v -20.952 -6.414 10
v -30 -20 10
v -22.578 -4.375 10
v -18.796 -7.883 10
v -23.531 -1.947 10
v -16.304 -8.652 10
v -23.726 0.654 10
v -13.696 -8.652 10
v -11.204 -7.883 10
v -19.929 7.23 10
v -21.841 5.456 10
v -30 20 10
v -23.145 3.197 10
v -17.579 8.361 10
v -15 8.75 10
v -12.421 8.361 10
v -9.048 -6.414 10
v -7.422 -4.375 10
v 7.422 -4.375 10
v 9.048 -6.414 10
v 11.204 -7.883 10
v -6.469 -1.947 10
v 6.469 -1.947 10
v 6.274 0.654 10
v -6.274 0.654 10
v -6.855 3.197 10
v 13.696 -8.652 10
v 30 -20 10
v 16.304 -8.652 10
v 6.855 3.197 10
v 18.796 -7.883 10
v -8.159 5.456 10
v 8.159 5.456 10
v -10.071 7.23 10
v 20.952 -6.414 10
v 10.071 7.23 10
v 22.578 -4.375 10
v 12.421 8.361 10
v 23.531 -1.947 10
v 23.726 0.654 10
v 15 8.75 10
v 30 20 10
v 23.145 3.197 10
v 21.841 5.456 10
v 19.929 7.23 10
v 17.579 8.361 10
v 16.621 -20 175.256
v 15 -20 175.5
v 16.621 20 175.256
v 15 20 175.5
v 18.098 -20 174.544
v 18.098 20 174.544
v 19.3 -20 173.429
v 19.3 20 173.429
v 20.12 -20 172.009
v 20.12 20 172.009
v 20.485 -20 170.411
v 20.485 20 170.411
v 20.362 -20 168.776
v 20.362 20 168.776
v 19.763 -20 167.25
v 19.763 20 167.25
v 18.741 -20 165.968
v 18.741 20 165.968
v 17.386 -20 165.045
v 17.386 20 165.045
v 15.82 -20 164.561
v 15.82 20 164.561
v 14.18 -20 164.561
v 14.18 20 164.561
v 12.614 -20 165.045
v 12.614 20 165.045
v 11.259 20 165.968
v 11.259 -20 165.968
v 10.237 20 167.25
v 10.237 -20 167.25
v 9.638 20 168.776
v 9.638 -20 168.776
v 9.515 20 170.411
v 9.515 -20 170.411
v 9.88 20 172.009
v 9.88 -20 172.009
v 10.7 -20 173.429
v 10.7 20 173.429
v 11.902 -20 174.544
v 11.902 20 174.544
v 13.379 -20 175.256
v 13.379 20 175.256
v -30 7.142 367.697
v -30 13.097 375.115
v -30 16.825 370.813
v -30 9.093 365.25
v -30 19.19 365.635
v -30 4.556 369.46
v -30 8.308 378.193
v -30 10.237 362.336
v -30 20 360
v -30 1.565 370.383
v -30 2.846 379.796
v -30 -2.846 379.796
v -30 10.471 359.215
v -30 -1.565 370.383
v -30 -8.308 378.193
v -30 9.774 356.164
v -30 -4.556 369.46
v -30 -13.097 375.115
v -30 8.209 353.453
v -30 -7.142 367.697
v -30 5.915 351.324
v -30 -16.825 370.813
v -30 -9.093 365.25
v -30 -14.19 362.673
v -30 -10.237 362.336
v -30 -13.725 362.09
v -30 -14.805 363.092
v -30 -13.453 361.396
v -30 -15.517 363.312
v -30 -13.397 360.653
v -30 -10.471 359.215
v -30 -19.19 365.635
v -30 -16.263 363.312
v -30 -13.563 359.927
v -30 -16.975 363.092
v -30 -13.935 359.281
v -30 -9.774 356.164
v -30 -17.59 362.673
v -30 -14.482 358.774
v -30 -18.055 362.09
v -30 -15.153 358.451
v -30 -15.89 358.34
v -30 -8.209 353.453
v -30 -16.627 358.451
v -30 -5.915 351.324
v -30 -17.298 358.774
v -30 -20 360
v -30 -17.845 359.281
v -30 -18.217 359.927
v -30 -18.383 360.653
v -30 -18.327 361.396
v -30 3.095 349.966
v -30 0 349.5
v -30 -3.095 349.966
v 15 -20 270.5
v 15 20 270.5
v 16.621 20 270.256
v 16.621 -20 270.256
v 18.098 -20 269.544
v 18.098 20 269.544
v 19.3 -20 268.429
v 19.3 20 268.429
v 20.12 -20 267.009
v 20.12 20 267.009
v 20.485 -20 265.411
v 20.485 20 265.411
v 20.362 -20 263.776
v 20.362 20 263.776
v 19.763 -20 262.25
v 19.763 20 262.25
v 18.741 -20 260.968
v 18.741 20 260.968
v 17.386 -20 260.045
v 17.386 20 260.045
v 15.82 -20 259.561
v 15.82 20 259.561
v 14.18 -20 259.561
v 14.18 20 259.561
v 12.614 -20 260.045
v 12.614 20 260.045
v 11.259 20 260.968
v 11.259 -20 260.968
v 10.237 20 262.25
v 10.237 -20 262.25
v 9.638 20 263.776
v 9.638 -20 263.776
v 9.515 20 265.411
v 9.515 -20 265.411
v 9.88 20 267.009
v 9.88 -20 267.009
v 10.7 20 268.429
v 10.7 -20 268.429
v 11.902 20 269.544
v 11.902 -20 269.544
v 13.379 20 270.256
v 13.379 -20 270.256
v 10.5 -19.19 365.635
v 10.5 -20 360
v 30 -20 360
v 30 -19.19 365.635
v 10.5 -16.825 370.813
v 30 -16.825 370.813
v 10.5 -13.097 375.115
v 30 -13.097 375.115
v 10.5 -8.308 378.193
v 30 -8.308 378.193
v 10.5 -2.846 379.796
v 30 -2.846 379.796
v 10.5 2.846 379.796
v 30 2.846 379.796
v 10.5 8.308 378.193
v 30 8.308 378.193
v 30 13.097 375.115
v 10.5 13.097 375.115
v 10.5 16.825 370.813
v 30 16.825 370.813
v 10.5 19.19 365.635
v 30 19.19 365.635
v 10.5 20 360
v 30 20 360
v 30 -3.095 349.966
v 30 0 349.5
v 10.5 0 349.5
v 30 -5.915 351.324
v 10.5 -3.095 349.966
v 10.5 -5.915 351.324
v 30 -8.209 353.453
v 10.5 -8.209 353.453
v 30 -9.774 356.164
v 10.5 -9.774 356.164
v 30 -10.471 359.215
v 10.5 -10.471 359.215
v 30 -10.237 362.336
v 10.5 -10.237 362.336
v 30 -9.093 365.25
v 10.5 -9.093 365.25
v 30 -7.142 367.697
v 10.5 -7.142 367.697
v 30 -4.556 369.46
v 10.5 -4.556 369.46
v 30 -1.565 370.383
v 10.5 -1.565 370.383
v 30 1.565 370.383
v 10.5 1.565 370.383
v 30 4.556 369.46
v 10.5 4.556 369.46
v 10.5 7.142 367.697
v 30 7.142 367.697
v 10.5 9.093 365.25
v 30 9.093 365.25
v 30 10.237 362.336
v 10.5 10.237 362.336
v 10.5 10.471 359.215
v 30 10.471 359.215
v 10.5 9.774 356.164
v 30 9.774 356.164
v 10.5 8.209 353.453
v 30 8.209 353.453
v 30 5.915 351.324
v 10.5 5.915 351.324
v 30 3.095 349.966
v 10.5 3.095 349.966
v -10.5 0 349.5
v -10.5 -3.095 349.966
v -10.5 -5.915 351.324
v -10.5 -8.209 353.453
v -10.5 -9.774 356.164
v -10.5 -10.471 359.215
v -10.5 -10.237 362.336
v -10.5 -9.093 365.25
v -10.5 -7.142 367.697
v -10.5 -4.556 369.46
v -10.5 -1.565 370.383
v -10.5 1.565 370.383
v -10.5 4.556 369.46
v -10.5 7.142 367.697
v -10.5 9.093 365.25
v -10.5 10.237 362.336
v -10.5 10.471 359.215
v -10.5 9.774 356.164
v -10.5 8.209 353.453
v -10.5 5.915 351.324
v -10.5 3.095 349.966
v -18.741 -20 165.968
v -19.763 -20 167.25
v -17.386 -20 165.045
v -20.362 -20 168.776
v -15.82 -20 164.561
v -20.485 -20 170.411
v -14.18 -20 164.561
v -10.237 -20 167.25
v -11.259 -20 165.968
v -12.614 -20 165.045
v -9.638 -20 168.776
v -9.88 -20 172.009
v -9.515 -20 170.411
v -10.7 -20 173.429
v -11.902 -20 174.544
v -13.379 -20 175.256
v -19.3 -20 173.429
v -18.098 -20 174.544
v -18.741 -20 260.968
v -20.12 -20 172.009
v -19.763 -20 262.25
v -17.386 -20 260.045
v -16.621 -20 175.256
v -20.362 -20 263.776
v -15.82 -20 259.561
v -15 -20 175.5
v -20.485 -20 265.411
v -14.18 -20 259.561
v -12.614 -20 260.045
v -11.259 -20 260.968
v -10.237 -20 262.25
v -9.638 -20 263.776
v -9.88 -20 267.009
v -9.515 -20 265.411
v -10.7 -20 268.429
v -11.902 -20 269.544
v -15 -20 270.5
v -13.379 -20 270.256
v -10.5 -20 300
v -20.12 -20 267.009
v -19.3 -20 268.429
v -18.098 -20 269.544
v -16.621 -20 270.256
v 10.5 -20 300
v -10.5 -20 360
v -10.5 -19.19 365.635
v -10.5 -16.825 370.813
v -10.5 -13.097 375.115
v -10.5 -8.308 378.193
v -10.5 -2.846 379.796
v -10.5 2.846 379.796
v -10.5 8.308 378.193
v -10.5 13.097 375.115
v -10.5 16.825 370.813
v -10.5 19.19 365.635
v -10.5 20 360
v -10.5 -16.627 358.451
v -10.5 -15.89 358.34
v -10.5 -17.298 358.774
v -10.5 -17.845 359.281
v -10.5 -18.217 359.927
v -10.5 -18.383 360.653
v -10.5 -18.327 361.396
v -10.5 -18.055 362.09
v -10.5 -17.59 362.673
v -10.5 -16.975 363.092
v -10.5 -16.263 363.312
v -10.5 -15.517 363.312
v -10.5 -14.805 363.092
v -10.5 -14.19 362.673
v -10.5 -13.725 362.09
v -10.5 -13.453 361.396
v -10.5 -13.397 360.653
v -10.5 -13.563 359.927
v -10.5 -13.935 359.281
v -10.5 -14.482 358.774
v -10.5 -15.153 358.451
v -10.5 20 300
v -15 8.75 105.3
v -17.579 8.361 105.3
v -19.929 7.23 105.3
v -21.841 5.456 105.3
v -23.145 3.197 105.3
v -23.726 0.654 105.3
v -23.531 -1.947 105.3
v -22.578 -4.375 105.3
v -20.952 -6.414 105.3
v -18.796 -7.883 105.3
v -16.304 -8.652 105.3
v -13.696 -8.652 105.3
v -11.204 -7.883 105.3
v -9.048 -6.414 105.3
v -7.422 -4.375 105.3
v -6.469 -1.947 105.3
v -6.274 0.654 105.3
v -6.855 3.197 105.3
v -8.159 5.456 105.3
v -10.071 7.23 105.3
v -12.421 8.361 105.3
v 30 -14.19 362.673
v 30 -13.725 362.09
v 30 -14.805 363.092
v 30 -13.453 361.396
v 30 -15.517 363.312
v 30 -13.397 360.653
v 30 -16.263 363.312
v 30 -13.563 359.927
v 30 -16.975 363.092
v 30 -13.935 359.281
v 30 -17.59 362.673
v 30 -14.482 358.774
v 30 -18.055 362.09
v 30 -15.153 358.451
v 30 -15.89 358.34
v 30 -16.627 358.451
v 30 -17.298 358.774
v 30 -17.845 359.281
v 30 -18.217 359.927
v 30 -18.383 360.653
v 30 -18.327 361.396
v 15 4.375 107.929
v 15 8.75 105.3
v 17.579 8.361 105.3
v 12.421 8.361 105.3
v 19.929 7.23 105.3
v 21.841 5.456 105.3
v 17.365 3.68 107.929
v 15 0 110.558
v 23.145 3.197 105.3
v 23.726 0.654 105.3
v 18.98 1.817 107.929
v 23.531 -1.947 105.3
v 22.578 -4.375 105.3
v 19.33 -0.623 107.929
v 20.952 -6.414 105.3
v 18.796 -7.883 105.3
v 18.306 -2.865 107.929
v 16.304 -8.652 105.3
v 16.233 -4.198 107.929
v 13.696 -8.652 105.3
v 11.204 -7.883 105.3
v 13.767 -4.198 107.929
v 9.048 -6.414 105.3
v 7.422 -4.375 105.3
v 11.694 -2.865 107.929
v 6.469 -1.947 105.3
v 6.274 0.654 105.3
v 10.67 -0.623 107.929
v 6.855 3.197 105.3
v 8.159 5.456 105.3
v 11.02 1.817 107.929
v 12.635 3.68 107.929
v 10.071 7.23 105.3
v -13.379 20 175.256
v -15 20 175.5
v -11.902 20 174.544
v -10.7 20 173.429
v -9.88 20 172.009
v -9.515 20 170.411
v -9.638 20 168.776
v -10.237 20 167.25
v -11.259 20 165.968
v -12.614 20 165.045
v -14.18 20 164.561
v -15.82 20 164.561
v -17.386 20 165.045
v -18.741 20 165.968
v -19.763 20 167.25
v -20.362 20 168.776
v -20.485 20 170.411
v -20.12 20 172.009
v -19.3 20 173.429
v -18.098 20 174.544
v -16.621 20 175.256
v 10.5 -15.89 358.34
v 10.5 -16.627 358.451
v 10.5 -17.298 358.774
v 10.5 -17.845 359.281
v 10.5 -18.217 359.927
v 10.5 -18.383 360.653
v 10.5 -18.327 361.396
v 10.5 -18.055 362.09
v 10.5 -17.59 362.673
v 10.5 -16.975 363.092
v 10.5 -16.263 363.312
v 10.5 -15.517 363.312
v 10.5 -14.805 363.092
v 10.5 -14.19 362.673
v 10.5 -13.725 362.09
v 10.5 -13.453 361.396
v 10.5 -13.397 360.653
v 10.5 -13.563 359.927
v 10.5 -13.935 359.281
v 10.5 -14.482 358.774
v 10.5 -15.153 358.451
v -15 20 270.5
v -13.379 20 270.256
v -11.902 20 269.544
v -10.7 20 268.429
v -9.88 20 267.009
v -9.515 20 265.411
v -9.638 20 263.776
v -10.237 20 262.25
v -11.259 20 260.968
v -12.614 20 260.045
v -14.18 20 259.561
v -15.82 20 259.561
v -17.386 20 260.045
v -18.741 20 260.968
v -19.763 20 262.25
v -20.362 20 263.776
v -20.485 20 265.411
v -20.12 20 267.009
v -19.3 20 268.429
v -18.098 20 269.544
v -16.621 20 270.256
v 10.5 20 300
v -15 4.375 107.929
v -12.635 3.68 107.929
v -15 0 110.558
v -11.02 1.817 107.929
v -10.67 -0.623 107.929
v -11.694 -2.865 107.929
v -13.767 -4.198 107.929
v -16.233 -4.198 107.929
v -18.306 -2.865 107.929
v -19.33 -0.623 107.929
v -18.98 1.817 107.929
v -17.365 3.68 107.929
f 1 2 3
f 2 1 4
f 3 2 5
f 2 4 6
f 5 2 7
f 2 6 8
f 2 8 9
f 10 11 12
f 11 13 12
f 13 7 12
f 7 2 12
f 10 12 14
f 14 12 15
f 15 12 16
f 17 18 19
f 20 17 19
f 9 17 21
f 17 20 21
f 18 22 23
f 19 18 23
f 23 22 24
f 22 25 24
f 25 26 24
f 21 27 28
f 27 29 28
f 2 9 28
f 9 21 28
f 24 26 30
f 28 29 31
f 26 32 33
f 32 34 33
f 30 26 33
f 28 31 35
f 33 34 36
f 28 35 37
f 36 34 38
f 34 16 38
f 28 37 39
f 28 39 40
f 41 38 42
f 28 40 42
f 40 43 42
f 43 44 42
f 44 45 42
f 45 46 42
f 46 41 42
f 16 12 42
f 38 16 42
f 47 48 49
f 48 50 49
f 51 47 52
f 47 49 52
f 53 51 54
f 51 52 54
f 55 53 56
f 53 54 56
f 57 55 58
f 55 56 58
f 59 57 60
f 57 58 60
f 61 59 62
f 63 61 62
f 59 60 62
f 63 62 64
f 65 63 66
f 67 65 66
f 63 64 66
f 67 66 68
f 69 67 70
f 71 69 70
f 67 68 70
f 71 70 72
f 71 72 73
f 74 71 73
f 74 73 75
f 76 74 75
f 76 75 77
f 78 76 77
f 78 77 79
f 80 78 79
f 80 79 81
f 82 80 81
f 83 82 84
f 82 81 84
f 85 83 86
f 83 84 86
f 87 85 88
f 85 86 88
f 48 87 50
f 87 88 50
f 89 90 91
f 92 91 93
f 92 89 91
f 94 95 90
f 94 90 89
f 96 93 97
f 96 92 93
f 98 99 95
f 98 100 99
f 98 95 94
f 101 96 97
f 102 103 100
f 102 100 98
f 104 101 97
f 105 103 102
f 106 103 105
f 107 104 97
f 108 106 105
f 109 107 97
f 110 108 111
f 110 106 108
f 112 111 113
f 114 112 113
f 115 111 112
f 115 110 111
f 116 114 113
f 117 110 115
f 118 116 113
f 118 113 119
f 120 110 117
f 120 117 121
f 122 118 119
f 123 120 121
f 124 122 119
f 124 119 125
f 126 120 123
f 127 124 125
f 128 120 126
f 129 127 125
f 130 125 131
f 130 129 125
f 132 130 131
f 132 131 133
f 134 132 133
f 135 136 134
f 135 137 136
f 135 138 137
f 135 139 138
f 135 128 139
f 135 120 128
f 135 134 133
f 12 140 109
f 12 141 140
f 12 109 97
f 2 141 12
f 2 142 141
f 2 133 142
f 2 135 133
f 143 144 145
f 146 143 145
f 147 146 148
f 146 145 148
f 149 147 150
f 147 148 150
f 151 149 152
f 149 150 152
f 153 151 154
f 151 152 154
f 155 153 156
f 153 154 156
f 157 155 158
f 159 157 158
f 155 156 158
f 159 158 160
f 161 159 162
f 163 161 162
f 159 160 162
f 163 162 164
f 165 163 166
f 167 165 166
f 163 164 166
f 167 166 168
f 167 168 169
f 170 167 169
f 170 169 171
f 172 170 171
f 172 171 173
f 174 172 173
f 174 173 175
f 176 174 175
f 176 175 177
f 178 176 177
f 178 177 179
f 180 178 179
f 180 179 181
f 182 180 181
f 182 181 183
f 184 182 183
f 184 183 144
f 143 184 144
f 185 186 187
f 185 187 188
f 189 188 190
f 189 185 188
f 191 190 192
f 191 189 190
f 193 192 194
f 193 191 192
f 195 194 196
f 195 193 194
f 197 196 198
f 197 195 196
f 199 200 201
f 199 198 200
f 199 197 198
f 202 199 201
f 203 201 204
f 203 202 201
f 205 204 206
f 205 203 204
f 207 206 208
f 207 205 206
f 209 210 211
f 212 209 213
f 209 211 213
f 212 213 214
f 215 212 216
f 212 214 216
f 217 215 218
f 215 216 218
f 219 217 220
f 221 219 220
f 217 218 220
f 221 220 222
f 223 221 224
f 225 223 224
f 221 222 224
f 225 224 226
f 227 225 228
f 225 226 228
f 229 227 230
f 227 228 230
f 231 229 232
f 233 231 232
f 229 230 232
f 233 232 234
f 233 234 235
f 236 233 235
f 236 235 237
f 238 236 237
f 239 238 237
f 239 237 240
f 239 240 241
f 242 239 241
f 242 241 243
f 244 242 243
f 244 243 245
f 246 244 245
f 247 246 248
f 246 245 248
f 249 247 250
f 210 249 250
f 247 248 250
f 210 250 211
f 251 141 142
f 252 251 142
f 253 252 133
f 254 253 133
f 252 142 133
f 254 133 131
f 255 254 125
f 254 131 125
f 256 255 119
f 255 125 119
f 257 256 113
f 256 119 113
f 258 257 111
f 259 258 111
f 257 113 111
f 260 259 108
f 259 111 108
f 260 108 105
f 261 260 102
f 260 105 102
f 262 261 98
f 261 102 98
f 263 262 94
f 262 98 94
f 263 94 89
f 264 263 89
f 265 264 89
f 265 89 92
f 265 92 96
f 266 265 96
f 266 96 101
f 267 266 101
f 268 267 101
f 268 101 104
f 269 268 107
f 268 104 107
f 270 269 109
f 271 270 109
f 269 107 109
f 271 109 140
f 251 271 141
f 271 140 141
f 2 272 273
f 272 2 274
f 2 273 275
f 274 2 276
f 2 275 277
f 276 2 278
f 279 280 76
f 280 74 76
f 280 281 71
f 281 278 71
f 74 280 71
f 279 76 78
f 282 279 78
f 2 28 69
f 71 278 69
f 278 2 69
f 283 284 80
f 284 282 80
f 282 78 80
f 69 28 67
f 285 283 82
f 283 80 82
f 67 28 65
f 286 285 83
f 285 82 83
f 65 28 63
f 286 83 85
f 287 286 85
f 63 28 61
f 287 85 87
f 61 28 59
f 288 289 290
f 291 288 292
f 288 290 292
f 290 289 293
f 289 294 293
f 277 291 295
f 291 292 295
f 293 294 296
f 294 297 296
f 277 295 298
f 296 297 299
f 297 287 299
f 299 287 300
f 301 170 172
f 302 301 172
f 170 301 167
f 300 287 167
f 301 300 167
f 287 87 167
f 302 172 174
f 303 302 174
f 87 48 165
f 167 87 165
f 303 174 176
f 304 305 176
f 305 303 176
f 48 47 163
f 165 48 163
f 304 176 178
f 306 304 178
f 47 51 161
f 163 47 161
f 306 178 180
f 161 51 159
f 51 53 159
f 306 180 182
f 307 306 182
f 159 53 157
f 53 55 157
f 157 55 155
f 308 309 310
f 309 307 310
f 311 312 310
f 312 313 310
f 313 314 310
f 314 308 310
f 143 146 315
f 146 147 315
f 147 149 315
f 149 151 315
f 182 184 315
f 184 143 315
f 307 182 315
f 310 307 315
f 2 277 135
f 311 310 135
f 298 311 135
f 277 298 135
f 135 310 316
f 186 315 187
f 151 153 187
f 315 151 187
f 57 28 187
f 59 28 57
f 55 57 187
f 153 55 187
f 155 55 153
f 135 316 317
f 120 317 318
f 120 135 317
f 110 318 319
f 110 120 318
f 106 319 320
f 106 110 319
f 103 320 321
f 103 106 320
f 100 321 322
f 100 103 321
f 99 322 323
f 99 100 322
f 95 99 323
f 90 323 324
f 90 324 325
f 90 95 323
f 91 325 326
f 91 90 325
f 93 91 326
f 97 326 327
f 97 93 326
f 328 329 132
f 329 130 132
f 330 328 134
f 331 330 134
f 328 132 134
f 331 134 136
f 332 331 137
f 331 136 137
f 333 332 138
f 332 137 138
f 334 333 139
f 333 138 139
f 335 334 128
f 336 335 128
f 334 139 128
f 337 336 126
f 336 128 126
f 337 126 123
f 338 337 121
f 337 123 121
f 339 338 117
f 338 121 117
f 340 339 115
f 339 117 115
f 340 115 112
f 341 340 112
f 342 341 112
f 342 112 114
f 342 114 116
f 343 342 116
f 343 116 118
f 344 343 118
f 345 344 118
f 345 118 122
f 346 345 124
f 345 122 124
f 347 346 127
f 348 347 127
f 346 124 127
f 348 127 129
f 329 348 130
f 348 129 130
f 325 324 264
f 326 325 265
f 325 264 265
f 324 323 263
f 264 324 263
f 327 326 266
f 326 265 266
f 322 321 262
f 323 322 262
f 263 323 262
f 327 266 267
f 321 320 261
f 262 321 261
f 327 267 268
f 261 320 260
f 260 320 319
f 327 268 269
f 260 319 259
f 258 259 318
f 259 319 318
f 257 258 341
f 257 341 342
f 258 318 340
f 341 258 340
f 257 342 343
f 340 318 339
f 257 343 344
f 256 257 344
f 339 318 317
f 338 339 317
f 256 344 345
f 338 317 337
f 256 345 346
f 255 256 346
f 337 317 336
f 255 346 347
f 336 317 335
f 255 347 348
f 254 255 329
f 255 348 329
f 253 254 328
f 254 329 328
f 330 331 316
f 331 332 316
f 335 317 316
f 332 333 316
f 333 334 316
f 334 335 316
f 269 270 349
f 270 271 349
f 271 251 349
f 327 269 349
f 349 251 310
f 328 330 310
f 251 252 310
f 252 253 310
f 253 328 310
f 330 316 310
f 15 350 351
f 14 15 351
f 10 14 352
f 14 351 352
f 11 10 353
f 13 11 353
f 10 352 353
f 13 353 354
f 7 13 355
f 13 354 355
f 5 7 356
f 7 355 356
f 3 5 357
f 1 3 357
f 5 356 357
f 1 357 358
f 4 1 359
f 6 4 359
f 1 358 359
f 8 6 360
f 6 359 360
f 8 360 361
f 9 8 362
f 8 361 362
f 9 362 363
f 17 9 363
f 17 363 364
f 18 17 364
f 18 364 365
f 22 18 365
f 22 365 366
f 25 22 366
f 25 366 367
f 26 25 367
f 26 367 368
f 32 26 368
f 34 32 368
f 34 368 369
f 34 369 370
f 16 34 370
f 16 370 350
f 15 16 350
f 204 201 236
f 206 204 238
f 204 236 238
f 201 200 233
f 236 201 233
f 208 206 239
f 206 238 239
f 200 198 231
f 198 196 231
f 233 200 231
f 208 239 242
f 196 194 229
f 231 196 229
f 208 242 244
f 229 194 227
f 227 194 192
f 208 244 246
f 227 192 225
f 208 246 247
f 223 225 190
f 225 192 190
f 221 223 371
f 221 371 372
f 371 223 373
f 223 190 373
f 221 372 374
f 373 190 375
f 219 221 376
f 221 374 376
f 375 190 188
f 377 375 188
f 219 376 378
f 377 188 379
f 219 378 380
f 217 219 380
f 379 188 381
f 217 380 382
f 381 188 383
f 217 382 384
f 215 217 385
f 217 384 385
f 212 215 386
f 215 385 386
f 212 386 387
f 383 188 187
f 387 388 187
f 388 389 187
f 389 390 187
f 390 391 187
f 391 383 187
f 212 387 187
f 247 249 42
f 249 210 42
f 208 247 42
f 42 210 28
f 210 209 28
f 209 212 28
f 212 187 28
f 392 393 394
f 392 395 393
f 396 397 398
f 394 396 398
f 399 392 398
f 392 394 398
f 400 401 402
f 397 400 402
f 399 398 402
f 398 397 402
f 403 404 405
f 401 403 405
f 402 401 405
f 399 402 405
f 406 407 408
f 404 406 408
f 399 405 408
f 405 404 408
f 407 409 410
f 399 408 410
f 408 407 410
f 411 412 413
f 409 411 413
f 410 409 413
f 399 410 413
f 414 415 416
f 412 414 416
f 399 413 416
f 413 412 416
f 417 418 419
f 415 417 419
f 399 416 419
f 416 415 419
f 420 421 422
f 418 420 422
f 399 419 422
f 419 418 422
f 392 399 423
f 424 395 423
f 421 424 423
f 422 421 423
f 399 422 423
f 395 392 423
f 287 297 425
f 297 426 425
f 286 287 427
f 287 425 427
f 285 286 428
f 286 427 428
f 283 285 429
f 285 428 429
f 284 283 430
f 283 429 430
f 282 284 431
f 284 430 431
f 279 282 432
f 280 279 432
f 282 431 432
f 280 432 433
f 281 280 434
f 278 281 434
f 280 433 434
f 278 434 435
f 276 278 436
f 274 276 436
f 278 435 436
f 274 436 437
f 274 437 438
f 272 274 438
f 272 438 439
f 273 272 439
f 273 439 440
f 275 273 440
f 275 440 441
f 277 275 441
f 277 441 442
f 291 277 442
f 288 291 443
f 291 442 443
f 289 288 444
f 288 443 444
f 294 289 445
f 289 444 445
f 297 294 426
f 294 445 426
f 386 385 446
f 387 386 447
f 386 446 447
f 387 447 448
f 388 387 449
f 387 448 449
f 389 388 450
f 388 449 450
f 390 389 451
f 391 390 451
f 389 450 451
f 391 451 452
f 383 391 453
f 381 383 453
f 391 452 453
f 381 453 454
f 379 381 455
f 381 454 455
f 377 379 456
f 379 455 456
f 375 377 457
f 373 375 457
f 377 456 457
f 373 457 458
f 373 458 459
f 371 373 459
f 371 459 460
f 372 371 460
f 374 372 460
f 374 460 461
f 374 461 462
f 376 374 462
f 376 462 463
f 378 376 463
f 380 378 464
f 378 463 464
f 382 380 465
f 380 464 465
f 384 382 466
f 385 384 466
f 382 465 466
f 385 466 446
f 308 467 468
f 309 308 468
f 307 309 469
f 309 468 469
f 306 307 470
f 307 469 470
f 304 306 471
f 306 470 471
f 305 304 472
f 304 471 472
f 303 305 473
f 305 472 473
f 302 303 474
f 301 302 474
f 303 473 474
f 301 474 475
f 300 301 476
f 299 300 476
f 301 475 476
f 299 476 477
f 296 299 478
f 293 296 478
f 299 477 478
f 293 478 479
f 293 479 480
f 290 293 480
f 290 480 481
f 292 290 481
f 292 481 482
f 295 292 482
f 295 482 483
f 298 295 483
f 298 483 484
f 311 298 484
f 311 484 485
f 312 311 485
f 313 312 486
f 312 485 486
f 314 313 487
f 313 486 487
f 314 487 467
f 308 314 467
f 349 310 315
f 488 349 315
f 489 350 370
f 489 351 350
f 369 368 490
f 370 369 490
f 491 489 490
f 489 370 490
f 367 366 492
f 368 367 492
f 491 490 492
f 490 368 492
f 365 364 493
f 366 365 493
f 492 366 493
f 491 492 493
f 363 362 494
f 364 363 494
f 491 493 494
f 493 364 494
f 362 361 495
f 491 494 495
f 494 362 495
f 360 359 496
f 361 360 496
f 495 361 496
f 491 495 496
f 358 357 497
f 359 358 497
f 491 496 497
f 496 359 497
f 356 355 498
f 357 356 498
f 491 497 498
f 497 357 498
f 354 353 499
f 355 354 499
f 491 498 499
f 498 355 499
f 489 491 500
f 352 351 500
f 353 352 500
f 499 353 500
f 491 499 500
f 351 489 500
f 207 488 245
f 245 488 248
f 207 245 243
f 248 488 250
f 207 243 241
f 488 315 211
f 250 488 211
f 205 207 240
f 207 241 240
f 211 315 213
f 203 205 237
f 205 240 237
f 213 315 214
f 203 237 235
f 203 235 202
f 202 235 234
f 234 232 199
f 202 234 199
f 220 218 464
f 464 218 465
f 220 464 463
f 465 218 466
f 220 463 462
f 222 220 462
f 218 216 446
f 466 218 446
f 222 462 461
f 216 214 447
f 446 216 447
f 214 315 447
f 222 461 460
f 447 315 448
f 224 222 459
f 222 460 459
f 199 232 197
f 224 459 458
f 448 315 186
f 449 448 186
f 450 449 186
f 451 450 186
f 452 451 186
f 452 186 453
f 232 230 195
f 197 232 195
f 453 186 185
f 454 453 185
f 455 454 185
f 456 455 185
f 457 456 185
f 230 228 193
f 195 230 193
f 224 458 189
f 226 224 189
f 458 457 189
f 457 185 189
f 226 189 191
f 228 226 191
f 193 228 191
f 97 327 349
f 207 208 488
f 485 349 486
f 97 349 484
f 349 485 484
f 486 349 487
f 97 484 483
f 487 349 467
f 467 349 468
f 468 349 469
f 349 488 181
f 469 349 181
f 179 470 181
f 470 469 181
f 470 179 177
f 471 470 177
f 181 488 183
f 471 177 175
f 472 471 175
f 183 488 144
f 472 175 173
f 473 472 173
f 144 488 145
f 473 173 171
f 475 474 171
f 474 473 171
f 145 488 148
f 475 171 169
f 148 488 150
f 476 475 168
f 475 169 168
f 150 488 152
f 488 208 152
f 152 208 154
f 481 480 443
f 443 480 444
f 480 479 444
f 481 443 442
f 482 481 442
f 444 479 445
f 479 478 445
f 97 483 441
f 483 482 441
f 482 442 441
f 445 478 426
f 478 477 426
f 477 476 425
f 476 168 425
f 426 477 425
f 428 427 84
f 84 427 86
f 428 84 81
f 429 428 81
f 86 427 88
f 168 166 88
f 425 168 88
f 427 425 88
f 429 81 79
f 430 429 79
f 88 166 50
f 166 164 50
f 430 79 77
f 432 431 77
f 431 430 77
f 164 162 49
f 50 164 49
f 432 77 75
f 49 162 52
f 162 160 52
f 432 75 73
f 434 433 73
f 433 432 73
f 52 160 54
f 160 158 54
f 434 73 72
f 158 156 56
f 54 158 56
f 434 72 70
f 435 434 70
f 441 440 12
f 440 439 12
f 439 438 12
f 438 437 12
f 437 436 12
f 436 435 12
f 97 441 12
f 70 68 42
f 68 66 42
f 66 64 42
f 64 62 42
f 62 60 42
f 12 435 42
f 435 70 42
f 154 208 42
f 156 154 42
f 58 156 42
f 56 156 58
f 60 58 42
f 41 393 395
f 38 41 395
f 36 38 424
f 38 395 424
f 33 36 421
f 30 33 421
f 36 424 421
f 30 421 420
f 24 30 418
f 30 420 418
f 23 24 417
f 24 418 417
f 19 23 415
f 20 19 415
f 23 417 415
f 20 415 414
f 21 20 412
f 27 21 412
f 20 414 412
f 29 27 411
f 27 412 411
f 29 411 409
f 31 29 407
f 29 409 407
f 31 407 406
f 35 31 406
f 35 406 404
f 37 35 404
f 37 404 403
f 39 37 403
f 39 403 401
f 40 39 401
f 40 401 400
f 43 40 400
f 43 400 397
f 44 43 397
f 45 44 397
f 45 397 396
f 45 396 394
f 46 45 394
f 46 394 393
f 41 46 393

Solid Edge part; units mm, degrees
sketch "Sketch1" plane through (0, 0, 0) normal (-1, 0, 0) x (0, -1, 0)
  line L0 (-20, 0) -> (20, 0)
  line L1 (20, 0) -> (20, 390)
  line L2 (20, 390) -> (-20, 390)
  line L3 (-20, 390) -> (-20, 0)
extrude "Protrusion1" add sketch "Sketch1" along normal mid plane 60
sketch "Sketch2" plane through (-30, 0, 187.5) normal (-1, 0, 0) x (0, 0, -1)
  circle A0 centre (-172.5, 0) radius 10.5
extrude "ExtrudedCutout_1" cut sketch "Sketch2" against normal blind 60
sketch "Sketch3" plane through (-30, 0, 187.5) normal (-1, 0, 0) x (0, 0, 1)
  line L0 (202.5, -20) -> (172.5, -20)
  line L1 (202.5, 20) -> (202.5, -20)
  line L2 (172.5, 20) -> (202.5, 20)
  arc A0 (172.5, 20) -> (172.5, -20) centre (172.5, 0) cw
extrude "ExtrudedCutout_2" cut sketch "Sketch3" against normal blind 60
extrude "ExtrudedCutout_3" [suppressed]
sketch "Sketch4" plane through (0, 0, 0) normal (0, 0, -1) x (0, -1, 0)
  line L0 (-20, 30) -> (20, 30)
  line L1 (20, 30) -> (20, -30)
  line L2 (20, -30) -> (-20, -30)
  line L3 (-20, -30) -> (-20, 30)
extrude "ExtrudedCutout_9" cut sketch "Sketch4" against normal blind 10
sketch "Sketch5" plane through (0, -20, 185) normal (0, -1, 0) x (0, 0, 1)
  line L0 (115, -10.5) -> (195, -10.5)
  line L1 (195, -10.5) -> (195, 10.5)
  line L2 (195, 10.5) -> (115, 10.5)
  line L3 (115, 10.5) -> (115, -10.5)
extrude "ExtrudedCutout_11" cut sketch "Sketch5" against normal blind 40
sketch "Sketch6" plane through (-30, 0, 195) normal (-1, 0, 0) x (0, 0, -1)
  circle A0 centre (-165.84, 15.89) radius 2.5
extrude "ExtrudedCutout_13" cut sketch "Sketch6" against normal blind 60
hole "Hole_1" at (15, 0, 10) direction (0, 0, 1) diameter 17.5 depth 95.3 tip angle 118
hole "Hole1" at (-15, 0, 10) direction (0, 0, 1) diameter 17.5 depth 95.3 tip angle 118
hole "Hole_3" at (15, 20, 170) direction (0, -1, 0) diameter 11 end up to next
hole "Hole2" at (-15, 20, 170) direction (0, -1, 0) diameter 11 end up to next
hole "Hole3" at (15, 20, 265) direction (0, -1, 0) diameter 11 end up to next
hole "Hole4" at (-15, 20, 265) direction (0, -1, 0) diameter 11 end up to next
properties material "Steel - Stainless:1.4301 , X5CrNi18-10"
